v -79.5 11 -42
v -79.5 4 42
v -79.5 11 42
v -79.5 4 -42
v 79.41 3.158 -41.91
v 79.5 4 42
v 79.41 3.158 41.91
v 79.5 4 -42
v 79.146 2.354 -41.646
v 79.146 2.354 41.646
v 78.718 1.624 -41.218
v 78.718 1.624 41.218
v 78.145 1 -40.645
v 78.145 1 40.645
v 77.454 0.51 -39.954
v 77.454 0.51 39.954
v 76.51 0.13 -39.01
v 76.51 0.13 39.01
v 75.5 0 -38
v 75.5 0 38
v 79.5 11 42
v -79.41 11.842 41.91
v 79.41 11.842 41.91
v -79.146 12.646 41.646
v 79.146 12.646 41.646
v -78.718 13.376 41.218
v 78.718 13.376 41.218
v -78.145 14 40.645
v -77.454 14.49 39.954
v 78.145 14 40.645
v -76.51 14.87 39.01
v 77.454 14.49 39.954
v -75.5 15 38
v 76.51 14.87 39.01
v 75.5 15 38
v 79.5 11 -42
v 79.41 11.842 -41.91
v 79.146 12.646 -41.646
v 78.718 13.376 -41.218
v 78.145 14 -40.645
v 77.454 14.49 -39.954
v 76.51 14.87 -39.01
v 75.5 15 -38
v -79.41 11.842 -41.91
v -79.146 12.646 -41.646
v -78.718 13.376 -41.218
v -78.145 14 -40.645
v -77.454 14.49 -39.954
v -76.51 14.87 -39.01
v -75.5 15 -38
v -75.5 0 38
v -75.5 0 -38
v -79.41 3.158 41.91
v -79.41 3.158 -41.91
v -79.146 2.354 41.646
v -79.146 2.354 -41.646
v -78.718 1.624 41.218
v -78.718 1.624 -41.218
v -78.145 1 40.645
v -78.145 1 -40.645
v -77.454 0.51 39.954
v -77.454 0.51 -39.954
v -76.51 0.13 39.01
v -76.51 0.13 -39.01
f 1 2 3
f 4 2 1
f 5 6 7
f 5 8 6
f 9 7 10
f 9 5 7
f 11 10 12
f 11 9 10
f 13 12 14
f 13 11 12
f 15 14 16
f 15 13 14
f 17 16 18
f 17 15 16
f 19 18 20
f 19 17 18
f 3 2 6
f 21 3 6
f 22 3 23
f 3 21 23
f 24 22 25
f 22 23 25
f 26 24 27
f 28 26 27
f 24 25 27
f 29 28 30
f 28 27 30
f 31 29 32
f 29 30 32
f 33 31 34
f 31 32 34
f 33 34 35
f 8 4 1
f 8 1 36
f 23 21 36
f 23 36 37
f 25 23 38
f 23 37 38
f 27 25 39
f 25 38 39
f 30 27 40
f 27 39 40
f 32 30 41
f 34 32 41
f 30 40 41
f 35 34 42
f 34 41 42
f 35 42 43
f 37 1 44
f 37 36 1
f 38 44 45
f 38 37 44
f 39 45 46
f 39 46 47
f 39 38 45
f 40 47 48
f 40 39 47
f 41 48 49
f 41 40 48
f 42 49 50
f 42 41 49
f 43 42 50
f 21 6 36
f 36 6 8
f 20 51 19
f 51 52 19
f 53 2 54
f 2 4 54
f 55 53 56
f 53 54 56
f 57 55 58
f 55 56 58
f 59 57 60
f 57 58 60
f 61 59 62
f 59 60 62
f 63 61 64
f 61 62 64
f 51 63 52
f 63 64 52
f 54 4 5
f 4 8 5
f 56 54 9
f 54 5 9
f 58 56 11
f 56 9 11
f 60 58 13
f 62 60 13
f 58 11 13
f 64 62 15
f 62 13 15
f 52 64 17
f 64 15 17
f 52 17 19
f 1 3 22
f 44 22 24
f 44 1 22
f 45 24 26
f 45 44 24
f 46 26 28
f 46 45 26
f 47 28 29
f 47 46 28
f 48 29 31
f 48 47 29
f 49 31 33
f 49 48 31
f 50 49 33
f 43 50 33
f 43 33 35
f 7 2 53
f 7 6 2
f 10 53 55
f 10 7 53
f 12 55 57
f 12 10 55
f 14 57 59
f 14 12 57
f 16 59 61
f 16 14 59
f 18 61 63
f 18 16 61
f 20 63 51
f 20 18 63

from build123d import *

# Parameters (mm, degrees)
SKETCH1_W           = 159
SKETCH1_H           = 84
BOSS_EXTRUDE1_DEPTH = 15
FILLET1_R           = 4


with BuildPart() as part:
    # Sketch1 → Boss-Extrude1 (new body)
    with BuildSketch(Plane(origin=(0, 0, 0), x_dir=(1, 0, 0), z_dir=(0, 1, 0))):
        Rectangle(SKETCH1_W, SKETCH1_H)
    extrude(amount=BOSS_EXTRUDE1_DEPTH)

    # Fillet1
    fillet1_edges = [part.edges().sort_by_distance(p)[0] for p in [
        (-79.5, 15, 0),
        (0, 15, 42),
        (79.5, 15, 0),
        (0, 0, 42),
        (-79.5, 0, 0),
        (0, 0, -42),
        (79.5, 0, 0),
        (0, 15, -42),
    ]]
    fillet(fillet1_edges, radius=FILLET1_R)


solid = part.part
